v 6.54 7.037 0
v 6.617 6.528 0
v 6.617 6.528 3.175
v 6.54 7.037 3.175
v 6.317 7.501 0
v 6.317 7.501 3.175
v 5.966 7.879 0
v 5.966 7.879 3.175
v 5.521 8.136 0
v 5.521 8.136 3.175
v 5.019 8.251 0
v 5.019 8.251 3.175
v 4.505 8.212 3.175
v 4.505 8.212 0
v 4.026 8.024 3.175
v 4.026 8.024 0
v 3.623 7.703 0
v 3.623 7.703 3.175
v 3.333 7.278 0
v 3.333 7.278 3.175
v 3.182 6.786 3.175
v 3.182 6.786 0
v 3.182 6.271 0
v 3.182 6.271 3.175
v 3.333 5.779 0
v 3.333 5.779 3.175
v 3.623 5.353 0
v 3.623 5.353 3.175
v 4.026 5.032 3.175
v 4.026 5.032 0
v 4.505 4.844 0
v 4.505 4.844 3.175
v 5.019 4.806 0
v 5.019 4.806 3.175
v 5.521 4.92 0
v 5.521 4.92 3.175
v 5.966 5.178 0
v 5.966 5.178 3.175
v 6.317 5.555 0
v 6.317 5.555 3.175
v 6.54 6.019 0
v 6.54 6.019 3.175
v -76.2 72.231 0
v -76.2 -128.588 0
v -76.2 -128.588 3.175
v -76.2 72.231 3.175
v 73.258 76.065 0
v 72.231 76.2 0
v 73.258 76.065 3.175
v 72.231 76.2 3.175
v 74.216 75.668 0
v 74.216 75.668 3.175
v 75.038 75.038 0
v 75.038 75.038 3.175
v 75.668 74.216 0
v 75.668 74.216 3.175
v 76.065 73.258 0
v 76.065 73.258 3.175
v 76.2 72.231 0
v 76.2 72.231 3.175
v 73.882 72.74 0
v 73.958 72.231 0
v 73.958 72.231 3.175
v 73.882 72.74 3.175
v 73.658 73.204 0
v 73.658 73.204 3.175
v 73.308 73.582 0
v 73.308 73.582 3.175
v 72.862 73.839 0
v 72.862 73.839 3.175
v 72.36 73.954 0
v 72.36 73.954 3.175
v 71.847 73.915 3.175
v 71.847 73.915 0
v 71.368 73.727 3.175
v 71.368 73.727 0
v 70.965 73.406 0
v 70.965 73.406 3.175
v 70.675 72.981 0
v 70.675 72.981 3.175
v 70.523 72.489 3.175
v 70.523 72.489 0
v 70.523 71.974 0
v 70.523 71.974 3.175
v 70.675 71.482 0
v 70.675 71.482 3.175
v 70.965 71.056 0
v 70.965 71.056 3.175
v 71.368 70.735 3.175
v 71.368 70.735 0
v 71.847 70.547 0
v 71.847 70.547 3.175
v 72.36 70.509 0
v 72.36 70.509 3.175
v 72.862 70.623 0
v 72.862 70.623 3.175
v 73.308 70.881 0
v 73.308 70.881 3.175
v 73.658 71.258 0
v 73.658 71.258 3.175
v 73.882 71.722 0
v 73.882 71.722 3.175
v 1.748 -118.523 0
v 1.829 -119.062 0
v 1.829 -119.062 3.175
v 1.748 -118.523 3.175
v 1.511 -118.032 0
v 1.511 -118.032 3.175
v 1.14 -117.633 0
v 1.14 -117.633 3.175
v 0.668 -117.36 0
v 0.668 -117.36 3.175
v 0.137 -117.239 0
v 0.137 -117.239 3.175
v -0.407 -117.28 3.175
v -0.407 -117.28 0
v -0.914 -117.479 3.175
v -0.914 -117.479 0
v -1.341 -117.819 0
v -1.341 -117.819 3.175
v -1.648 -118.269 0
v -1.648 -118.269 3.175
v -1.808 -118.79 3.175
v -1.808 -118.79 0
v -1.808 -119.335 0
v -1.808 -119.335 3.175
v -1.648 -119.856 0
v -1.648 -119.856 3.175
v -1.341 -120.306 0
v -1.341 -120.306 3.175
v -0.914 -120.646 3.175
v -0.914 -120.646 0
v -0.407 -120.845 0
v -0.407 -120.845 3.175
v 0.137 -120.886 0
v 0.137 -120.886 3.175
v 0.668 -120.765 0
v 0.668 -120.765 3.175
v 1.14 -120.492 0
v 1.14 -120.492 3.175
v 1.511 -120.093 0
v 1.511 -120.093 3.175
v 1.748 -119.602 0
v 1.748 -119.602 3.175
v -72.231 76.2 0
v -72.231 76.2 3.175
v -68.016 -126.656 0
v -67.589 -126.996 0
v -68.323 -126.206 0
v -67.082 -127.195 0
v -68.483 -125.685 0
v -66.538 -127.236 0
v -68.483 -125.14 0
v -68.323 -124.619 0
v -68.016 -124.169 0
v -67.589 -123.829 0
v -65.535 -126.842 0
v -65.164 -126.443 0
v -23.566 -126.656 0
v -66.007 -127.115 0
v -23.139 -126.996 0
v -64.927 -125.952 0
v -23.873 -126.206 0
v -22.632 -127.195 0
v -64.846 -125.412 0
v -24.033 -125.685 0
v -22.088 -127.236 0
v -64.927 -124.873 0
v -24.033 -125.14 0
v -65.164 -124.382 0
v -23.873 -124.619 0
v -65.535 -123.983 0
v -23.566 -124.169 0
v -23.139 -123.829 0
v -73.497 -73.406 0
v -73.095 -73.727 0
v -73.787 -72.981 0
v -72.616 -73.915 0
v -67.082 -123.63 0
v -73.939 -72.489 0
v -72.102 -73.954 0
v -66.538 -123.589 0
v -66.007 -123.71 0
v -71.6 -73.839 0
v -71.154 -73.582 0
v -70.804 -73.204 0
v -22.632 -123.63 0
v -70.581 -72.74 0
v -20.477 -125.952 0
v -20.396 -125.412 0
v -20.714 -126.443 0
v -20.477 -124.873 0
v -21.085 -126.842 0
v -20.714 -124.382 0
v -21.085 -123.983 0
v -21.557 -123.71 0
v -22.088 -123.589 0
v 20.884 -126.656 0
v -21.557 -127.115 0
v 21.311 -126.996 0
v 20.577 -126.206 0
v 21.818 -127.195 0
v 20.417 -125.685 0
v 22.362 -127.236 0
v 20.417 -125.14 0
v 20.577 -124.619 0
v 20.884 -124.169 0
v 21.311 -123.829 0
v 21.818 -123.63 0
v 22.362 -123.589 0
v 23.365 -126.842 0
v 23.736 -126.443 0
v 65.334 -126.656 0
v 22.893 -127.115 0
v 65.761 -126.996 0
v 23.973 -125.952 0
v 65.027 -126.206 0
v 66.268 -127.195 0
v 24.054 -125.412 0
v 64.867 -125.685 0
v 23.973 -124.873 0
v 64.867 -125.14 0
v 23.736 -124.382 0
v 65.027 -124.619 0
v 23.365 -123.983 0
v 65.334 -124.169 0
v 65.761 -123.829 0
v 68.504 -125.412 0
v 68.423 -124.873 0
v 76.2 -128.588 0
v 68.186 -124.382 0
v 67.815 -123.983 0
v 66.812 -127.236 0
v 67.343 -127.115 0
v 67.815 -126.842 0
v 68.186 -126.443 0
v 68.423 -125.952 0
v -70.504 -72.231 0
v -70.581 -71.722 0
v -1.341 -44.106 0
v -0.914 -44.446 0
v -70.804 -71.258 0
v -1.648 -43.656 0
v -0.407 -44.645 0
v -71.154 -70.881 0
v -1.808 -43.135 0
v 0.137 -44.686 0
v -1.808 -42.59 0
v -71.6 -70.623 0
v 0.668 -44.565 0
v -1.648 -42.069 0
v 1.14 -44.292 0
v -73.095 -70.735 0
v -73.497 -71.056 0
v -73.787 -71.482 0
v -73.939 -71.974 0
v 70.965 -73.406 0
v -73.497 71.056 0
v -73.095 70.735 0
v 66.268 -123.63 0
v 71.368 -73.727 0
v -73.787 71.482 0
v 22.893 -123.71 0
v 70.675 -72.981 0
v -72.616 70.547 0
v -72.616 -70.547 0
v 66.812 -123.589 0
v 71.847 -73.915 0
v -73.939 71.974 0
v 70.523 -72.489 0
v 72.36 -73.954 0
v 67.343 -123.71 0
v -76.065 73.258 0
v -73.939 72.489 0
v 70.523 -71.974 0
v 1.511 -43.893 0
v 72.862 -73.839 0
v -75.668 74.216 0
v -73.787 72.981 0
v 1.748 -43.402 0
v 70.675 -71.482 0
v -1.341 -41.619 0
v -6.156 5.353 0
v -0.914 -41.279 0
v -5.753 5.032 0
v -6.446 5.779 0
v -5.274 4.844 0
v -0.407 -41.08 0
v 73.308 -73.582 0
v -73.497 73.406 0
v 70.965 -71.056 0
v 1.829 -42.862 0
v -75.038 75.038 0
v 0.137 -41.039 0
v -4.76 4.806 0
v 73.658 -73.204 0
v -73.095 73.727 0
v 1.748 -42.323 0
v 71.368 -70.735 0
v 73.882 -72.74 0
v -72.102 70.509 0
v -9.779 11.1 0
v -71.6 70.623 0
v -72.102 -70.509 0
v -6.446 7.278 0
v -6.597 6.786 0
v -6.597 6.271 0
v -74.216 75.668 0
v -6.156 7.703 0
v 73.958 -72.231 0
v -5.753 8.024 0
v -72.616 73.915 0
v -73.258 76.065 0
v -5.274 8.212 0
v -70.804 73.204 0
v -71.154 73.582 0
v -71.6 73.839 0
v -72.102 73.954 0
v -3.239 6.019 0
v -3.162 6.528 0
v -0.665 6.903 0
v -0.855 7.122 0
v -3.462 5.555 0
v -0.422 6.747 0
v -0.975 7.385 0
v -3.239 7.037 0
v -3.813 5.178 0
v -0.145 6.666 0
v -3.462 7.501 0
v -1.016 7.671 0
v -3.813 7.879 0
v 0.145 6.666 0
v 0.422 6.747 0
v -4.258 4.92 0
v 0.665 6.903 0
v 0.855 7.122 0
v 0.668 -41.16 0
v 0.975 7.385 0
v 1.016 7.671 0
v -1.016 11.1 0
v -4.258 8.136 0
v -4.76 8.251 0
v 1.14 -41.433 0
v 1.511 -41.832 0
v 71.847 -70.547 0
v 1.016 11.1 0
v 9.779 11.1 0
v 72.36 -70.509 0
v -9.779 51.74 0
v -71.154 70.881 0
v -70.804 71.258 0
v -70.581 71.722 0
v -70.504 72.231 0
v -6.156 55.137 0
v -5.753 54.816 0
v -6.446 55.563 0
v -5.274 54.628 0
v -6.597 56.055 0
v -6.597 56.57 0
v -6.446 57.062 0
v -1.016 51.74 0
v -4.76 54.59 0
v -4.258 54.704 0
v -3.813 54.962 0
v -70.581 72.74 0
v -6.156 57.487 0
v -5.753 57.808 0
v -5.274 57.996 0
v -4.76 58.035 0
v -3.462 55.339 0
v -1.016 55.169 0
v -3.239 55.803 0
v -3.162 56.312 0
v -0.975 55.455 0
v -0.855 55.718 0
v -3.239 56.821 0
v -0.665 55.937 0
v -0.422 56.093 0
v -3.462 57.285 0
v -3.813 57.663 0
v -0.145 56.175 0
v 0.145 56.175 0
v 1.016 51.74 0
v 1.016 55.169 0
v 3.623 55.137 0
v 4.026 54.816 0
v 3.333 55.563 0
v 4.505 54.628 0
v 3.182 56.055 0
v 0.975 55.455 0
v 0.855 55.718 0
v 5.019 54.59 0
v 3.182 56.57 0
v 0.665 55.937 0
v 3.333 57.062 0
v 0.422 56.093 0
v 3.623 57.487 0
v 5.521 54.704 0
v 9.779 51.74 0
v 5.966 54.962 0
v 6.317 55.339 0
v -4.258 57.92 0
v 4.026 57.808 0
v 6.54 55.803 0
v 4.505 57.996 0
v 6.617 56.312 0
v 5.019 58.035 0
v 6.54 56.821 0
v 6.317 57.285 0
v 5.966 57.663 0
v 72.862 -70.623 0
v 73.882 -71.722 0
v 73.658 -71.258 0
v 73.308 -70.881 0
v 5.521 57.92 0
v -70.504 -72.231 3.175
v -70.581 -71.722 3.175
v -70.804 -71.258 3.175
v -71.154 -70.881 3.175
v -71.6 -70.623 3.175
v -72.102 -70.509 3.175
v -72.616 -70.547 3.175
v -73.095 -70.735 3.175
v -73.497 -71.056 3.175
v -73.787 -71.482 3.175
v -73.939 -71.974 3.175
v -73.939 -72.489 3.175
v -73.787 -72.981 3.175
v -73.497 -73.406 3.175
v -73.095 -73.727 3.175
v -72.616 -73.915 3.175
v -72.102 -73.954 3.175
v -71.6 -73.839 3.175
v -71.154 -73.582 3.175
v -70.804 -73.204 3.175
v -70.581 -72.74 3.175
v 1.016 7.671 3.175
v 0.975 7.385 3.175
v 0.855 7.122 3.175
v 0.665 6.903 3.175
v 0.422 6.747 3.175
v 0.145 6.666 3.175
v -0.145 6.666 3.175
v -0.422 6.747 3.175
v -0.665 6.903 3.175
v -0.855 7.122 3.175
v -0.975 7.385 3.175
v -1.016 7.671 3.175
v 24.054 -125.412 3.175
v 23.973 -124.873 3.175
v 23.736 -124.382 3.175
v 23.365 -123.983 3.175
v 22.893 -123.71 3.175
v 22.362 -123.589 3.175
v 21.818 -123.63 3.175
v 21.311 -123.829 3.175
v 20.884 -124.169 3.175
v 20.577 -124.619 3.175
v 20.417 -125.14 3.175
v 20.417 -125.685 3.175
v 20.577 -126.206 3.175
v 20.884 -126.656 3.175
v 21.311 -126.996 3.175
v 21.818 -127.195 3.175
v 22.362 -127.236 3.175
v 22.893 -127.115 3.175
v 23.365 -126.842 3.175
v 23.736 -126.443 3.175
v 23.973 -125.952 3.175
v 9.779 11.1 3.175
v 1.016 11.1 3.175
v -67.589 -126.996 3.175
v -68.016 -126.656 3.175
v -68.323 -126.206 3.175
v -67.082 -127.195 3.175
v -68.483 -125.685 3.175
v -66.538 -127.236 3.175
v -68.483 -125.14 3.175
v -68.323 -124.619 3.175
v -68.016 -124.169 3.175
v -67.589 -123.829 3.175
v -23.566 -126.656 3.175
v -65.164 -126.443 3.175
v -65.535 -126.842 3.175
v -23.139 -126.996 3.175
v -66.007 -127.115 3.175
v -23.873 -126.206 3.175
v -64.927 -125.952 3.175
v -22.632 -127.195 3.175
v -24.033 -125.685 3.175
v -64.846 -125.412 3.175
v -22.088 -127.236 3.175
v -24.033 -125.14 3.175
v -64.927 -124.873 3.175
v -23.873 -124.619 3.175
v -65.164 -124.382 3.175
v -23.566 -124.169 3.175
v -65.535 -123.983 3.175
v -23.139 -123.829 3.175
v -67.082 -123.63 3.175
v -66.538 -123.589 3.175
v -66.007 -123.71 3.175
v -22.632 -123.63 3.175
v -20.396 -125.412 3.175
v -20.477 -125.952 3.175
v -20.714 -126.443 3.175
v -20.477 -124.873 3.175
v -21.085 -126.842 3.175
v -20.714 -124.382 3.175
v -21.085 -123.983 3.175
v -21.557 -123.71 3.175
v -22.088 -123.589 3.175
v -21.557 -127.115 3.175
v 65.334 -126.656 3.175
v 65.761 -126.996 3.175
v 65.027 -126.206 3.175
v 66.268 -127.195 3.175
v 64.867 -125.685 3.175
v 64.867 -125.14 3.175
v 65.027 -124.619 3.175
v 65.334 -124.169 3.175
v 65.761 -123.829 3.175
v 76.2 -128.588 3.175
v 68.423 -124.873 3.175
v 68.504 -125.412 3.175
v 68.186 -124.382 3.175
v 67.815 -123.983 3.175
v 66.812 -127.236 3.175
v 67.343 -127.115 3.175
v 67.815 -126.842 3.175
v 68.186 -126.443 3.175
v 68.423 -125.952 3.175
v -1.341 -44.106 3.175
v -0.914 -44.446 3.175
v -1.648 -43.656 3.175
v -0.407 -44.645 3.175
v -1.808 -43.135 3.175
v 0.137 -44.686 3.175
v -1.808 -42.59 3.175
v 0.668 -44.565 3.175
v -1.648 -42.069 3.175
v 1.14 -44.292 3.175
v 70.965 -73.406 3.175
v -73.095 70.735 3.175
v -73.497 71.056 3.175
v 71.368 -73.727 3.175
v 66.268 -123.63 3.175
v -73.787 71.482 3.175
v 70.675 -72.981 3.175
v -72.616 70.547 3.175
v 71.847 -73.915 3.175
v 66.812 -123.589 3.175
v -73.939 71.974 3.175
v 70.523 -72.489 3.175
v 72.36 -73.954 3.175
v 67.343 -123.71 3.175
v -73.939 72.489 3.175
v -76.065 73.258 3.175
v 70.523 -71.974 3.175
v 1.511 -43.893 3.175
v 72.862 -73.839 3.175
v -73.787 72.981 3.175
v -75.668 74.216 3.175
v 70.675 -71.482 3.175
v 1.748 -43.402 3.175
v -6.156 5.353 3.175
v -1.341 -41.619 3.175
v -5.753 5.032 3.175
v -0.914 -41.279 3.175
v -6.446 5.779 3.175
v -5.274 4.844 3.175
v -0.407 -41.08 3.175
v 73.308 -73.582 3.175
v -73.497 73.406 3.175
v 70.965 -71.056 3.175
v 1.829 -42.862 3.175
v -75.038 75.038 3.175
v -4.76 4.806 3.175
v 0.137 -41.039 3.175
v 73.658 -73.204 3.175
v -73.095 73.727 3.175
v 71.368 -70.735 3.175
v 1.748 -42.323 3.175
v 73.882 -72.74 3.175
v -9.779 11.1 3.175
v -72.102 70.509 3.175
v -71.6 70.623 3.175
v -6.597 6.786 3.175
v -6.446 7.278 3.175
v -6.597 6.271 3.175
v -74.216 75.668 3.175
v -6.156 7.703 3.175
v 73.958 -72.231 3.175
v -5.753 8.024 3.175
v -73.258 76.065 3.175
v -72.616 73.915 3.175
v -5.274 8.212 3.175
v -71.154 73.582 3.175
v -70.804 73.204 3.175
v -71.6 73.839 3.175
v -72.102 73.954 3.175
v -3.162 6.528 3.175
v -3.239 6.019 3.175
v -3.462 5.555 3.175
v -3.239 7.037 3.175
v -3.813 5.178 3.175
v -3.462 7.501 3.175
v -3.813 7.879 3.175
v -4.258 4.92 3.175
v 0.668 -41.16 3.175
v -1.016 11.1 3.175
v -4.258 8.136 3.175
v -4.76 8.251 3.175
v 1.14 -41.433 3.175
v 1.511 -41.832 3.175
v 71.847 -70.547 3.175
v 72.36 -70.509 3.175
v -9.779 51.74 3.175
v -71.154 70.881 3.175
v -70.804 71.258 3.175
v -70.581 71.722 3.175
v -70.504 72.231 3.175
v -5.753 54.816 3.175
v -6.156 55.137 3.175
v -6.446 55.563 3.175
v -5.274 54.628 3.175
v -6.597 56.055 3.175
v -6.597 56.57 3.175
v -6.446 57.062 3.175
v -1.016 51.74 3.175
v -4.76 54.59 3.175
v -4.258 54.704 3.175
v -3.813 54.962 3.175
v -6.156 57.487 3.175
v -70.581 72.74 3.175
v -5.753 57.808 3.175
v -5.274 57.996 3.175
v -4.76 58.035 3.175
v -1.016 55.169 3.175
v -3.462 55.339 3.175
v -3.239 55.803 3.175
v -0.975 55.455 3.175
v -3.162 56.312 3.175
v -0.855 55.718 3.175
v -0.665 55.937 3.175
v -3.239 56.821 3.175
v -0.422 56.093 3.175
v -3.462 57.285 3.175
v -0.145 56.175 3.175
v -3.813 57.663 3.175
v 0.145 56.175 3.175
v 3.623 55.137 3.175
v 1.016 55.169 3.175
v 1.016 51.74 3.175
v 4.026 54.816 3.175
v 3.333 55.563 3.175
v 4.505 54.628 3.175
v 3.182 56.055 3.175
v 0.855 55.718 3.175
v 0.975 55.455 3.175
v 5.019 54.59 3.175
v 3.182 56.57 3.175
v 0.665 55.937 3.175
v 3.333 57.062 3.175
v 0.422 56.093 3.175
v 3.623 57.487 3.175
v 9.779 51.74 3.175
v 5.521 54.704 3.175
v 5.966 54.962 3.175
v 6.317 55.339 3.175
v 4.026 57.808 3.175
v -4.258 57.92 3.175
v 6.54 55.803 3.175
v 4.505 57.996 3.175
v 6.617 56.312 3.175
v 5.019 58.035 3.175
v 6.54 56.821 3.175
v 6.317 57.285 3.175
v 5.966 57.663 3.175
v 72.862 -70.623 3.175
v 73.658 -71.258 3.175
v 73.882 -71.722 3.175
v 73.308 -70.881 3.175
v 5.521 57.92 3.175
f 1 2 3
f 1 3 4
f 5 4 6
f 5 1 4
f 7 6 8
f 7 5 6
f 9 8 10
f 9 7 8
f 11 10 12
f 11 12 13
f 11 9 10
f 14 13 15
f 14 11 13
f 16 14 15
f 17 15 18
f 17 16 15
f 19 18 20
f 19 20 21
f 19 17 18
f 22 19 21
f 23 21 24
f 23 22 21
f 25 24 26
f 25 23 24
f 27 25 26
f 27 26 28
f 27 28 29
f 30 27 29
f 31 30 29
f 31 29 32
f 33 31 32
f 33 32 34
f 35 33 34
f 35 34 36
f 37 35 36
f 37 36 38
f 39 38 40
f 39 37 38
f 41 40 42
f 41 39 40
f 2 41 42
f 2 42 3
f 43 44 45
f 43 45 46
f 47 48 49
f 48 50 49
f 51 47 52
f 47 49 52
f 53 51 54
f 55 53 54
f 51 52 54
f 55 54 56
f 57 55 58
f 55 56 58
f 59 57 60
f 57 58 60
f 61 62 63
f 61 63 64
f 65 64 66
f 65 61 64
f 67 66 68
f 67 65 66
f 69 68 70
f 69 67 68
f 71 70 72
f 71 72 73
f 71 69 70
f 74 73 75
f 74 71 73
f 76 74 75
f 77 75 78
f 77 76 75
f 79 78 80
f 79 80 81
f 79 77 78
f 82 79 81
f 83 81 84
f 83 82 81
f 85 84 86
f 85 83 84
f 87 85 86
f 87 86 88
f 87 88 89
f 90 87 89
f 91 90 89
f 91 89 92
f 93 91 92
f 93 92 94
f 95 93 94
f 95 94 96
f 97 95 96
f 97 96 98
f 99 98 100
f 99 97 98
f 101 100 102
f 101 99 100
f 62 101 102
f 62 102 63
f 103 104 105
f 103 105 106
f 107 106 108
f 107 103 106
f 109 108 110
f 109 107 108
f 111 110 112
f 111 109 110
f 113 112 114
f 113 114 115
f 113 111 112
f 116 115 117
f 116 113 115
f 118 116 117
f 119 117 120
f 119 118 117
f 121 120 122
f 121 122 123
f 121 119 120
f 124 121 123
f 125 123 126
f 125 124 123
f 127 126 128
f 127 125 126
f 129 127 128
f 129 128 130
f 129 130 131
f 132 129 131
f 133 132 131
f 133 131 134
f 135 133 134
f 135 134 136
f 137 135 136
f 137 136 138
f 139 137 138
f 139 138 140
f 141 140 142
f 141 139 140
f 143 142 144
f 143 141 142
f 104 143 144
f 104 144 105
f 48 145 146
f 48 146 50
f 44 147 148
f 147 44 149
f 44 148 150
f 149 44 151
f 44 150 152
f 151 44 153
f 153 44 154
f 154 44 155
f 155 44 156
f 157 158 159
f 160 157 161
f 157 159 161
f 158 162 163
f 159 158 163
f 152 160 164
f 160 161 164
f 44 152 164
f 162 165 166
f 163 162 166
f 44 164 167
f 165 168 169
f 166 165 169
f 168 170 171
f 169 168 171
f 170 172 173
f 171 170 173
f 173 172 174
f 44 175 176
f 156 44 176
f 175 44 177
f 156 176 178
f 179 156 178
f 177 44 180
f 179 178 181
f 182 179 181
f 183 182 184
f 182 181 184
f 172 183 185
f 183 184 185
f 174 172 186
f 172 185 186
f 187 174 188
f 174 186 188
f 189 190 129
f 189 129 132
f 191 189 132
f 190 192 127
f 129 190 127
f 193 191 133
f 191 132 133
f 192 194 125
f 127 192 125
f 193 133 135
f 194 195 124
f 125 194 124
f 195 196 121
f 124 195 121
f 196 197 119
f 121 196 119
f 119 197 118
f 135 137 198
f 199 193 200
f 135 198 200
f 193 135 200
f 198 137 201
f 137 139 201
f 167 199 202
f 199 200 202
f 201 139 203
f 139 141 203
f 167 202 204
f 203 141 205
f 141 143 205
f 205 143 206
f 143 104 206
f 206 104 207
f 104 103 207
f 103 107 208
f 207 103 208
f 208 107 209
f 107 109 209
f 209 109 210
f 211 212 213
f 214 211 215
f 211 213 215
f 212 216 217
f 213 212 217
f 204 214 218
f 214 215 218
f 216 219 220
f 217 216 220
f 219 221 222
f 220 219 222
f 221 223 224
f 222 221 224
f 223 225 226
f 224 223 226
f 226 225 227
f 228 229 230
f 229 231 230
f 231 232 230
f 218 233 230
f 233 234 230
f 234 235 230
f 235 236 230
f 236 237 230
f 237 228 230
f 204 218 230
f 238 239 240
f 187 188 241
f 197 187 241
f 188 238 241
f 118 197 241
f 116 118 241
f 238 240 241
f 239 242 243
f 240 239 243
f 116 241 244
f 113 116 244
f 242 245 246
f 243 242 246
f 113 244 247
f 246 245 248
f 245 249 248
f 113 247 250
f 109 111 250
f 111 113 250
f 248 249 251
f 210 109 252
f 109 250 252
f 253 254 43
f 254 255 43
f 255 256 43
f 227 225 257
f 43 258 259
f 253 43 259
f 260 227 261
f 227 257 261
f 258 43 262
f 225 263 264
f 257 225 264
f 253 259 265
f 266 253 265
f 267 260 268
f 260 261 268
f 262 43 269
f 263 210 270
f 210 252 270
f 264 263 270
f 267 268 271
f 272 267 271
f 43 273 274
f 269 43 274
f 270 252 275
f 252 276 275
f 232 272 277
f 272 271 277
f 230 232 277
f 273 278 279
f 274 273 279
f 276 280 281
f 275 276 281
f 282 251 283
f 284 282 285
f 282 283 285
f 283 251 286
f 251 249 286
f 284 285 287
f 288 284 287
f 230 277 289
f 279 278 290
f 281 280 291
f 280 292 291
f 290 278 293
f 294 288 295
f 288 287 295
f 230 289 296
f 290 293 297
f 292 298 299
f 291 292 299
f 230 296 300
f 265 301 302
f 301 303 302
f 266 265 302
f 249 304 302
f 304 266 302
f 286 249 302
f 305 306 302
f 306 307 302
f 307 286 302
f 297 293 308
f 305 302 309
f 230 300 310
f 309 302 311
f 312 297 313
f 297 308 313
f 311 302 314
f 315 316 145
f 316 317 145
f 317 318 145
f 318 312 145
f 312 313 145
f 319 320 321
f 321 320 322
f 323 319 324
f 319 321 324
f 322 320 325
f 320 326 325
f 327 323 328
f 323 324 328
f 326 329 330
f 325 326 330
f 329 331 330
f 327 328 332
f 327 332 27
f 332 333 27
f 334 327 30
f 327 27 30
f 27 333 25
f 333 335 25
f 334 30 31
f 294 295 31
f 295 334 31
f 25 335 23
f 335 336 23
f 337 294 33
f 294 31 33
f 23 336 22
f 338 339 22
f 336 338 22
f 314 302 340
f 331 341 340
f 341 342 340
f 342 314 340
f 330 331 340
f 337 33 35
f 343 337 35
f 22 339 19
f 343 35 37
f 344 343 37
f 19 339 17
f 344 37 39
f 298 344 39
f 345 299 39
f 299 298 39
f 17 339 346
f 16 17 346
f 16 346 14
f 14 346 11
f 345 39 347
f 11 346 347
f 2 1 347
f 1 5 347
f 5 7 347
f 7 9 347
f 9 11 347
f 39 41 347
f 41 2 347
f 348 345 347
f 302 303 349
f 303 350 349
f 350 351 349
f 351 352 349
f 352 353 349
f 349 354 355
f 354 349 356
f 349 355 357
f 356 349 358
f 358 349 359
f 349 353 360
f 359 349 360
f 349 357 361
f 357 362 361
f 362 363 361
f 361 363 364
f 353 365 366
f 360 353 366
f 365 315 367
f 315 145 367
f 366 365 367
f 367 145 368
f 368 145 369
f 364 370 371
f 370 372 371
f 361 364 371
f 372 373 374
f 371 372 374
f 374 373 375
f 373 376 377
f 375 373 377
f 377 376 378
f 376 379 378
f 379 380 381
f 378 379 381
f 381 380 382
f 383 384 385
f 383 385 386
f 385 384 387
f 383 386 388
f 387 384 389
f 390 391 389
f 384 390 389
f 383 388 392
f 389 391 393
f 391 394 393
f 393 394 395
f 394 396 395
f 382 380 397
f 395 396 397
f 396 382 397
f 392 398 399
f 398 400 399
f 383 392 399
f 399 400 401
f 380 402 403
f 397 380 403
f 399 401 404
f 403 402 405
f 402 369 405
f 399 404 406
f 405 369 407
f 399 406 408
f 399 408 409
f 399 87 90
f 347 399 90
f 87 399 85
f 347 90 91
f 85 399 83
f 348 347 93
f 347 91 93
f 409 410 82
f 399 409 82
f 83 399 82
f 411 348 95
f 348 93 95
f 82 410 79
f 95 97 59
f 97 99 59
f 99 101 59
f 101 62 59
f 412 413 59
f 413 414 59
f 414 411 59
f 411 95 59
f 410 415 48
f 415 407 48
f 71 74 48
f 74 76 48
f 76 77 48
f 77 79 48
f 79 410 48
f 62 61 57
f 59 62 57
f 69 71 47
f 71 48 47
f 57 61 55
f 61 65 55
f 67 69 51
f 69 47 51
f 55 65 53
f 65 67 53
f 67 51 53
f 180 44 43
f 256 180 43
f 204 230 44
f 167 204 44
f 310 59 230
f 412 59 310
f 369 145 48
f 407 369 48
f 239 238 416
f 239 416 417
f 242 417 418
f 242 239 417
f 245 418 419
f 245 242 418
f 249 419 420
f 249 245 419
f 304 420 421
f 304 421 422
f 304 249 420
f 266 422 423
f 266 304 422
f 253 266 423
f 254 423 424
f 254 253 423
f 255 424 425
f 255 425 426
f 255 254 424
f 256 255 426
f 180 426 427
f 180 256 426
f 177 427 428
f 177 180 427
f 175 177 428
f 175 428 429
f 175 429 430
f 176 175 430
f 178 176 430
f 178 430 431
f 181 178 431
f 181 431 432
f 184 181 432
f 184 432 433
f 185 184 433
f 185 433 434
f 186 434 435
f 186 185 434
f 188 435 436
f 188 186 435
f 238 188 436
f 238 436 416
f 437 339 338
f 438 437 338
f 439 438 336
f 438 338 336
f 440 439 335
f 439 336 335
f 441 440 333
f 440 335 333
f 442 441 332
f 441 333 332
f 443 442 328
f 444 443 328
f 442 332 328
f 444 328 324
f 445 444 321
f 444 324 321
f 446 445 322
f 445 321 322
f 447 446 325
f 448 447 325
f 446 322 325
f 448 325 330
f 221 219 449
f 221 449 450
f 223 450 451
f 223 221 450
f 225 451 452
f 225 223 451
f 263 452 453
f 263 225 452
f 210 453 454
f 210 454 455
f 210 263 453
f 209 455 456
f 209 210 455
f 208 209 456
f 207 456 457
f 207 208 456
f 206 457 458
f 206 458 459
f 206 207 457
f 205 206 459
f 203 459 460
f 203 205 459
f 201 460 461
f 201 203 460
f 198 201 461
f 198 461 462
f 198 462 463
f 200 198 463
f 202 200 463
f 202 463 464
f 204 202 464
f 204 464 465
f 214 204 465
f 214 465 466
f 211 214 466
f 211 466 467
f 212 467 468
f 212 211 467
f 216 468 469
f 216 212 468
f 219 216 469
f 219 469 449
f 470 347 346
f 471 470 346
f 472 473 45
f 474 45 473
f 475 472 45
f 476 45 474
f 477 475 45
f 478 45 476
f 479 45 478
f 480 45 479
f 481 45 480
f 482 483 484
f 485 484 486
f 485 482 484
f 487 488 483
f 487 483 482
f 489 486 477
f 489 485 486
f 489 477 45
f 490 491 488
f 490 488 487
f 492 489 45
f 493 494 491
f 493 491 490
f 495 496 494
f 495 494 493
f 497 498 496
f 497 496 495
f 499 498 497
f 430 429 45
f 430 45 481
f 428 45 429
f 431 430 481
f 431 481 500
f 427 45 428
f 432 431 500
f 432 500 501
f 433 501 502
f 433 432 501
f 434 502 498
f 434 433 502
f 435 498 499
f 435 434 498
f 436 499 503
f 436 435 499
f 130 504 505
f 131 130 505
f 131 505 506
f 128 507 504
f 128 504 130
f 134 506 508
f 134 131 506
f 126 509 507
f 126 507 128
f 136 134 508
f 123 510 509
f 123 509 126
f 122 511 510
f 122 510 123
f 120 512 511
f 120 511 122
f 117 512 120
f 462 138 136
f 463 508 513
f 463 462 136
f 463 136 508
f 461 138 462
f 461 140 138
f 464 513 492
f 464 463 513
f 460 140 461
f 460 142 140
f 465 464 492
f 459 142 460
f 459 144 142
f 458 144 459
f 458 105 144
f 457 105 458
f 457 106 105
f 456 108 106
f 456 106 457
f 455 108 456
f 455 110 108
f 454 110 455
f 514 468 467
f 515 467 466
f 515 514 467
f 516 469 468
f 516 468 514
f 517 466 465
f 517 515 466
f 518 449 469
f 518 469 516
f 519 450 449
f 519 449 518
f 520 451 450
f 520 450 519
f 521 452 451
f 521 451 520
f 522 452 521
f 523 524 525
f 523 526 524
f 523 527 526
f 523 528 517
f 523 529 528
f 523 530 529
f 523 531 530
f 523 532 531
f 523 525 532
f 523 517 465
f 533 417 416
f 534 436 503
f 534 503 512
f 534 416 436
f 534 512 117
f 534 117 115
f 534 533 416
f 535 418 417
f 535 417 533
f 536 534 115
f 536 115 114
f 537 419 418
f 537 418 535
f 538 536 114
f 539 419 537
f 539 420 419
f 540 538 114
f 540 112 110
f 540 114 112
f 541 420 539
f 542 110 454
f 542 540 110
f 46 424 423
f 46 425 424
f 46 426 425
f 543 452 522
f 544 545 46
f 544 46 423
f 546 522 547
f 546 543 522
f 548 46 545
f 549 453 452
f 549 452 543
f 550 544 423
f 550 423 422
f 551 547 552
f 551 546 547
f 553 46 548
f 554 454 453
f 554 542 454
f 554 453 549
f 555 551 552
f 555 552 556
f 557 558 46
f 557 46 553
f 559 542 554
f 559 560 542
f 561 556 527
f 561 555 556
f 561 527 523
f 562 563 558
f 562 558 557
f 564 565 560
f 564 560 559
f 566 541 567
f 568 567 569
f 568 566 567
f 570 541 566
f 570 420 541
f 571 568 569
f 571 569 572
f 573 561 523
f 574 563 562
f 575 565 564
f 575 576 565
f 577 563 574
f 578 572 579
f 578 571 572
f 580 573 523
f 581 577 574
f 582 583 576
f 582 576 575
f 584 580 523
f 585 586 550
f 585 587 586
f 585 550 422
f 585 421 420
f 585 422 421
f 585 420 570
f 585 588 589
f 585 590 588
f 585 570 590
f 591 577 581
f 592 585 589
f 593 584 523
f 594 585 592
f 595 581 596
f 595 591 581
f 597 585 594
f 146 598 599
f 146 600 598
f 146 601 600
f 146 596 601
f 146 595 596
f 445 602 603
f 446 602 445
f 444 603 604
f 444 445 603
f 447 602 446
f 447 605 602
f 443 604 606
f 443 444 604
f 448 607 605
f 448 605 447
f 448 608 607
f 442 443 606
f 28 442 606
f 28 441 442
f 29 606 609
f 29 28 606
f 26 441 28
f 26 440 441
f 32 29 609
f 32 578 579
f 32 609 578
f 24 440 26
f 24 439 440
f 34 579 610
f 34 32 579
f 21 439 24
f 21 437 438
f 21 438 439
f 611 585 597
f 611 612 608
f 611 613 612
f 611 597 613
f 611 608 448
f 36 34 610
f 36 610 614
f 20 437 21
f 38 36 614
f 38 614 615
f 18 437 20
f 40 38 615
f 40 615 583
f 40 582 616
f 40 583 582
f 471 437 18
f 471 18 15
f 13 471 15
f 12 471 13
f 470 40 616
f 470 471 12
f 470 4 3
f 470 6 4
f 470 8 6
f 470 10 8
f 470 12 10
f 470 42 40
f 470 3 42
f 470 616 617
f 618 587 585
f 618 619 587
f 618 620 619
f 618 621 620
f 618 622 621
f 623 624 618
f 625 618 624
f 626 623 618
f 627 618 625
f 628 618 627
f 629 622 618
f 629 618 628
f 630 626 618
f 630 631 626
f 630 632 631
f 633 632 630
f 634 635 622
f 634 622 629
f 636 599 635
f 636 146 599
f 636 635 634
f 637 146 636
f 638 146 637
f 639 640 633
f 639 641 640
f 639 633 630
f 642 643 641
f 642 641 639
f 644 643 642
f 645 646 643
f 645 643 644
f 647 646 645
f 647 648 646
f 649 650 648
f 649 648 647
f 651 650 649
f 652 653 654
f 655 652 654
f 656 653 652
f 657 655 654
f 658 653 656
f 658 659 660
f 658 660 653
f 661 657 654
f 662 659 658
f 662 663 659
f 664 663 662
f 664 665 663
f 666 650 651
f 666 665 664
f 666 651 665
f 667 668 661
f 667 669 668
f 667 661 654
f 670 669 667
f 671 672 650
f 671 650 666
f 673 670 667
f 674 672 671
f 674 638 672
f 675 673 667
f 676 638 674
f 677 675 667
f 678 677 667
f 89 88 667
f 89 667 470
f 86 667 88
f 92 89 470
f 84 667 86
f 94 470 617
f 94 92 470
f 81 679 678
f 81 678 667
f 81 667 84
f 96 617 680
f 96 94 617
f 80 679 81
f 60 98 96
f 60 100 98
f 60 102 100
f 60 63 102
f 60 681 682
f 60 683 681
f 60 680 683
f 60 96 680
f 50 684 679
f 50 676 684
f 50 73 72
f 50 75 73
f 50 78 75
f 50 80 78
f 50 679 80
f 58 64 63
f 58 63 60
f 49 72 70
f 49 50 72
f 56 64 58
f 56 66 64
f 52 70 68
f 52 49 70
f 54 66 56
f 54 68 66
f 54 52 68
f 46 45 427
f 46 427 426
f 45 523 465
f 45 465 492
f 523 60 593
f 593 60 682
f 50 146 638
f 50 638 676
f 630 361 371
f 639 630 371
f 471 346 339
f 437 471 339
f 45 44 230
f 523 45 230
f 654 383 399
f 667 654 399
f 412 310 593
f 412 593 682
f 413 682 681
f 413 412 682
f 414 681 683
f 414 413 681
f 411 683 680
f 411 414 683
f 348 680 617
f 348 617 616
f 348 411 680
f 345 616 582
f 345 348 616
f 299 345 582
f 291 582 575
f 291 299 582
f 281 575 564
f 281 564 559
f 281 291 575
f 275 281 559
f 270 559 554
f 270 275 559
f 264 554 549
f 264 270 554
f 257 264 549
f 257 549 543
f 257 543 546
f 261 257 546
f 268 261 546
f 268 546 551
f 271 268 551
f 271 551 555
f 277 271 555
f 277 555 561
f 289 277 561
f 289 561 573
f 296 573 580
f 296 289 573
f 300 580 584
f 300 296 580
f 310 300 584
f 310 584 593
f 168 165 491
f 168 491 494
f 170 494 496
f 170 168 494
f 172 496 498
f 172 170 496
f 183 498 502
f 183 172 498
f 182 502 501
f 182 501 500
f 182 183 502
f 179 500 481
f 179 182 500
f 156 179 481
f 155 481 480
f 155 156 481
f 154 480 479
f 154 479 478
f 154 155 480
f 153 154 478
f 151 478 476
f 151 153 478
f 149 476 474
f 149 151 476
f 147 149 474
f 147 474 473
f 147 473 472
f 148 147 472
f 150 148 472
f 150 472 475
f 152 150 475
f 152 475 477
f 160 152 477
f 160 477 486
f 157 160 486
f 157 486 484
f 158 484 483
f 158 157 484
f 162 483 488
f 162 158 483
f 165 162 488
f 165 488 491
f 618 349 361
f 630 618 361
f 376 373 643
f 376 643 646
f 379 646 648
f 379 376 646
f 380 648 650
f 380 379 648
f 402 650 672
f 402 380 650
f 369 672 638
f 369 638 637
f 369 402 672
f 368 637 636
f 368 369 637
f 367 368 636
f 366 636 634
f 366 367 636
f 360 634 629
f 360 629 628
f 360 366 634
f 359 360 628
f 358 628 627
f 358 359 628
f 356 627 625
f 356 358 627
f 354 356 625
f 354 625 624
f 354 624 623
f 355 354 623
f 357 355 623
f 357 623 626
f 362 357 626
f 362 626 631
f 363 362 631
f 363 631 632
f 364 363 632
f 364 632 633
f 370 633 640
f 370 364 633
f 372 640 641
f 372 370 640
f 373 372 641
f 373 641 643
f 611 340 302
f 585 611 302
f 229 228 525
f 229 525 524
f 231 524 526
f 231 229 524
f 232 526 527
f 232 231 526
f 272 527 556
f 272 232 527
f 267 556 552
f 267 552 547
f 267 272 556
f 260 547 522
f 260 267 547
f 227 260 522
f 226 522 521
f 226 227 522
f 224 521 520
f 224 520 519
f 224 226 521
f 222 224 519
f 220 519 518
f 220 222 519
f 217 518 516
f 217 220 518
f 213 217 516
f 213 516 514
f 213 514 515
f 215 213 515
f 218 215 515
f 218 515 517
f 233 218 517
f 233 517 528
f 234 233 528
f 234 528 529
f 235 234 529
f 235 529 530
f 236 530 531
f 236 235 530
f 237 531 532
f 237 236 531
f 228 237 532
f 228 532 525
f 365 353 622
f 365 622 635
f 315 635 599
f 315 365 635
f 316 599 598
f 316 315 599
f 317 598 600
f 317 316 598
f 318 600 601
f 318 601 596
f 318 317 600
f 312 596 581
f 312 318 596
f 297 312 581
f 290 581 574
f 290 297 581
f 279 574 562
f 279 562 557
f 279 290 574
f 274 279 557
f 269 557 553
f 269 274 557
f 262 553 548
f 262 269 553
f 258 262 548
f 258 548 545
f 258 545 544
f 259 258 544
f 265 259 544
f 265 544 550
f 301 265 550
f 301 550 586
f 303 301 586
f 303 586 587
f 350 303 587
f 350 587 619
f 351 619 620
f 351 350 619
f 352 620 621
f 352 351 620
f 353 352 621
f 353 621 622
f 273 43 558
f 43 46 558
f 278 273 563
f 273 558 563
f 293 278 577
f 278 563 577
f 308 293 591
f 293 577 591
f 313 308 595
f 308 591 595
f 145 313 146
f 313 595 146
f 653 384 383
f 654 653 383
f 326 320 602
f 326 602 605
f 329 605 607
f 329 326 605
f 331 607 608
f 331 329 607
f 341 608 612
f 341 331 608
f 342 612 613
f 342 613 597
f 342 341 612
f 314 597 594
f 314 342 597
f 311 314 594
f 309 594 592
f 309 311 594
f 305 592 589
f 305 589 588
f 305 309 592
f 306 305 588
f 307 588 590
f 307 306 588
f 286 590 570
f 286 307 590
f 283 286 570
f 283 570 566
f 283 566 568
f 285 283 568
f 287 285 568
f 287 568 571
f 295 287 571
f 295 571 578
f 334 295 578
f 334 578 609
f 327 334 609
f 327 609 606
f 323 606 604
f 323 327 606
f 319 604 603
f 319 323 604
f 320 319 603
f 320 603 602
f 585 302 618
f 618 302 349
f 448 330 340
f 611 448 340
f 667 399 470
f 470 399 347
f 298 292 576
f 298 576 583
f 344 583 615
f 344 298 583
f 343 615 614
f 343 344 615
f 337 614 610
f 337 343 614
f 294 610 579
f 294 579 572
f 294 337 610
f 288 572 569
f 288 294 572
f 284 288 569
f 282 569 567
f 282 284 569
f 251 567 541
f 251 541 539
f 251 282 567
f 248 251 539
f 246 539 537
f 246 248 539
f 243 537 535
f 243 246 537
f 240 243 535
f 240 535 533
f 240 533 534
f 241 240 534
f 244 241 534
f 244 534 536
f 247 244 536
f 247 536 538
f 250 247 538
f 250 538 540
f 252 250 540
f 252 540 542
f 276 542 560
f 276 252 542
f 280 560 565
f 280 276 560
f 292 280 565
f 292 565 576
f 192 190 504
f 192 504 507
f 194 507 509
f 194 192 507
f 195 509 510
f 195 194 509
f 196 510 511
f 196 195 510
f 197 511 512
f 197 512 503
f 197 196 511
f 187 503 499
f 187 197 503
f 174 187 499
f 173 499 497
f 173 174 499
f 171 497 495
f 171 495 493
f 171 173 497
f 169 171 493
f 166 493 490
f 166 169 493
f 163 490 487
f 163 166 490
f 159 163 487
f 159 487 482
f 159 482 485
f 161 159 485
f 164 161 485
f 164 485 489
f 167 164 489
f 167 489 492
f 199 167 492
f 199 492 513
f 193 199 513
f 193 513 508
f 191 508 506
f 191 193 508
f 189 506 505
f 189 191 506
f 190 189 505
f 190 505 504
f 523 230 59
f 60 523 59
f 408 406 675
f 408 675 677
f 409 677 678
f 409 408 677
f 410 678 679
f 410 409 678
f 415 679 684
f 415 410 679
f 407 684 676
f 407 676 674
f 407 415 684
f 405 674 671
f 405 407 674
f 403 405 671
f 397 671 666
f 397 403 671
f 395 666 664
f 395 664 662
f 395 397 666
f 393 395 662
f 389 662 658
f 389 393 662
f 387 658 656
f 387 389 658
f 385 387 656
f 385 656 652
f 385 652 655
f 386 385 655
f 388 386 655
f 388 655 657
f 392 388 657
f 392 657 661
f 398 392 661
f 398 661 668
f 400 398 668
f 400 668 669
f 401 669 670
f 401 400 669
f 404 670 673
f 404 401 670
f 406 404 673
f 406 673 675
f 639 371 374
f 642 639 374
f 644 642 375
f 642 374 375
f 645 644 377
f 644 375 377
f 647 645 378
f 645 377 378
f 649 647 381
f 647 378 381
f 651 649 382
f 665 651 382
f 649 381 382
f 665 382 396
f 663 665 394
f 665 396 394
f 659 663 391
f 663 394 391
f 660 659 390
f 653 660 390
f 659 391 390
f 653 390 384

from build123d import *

# Parameters (mm, degrees)
F0_W     = 152.4
F0_H     = 204.7875
F0_R     = 1.8288
F0_R_2   = 1.7272
F1_DEPTH = 3.175
F2_R     = 3.96875


with BuildPart() as f1:
    # F0 (on Top) → F1 (new body)
    with BuildSketch(Plane.XY):
        with Locations((0, -26.19375)):
            Rectangle(F0_W, F0_H)
        with Locations((-66.675, -125.4125)):
            Circle(F0_R, mode=Mode.SUBTRACT)
        with Locations((-22.225, -125.4125)):
            Circle(F0_R, mode=Mode.SUBTRACT)
        with Locations((-72.23125, -72.23125)):
            Circle(F0_R_2, mode=Mode.SUBTRACT)
        with Locations((0, -119.0625)):
            Circle(F0_R, mode=Mode.SUBTRACT)
        with Locations((22.225, -125.4125)):
            Circle(F0_R, mode=Mode.SUBTRACT)
        with Locations((66.675, -125.4125)):
            Circle(F0_R, mode=Mode.SUBTRACT)
        with Locations((0, -42.8625)):
            Circle(F0_R, mode=Mode.SUBTRACT)
        with Locations((72.23125, -72.23125)):
            Circle(F0_R_2, mode=Mode.SUBTRACT)
        with Locations((-4.8895, 6.528203)):
            Circle(F0_R_2, mode=Mode.SUBTRACT)
        with Locations((-72.23125, 72.23125)):
            Circle(F0_R_2, mode=Mode.SUBTRACT)
        with Locations((-4.8895, 56.312203)):
            Circle(F0_R_2, mode=Mode.SUBTRACT)
        with Locations((4.8895, 6.528203)):
            Circle(F0_R_2, mode=Mode.SUBTRACT)
        with BuildLine():
            Line((1.016, 55.169203), (1.016, 51.740203))
            Line((1.016, 51.740203), (9.779, 51.740203))
            Line((9.779, 51.740203), (9.779, 11.100203))
            Line((9.779, 11.100203), (1.016, 11.100203))
            Line((1.016, 11.100203), (1.016, 7.671203))
            ThreePointArc((1.016, 7.671203), (0, 6.655203), (-1.016, 7.671203))
            Line((-1.016, 7.671203), (-1.016, 11.100203))
            Line((-1.016, 11.100203), (-9.779, 11.100203))
            Line((-9.779, 11.100203), (-9.779, 51.740203))
            Line((-9.779, 51.740203), (-1.016, 51.740203))
            Line((-1.016, 51.740203), (-1.016, 55.169203))
            ThreePointArc((-1.016, 55.169203), (0, 56.185203), (1.016, 55.169203))
        make_face(mode=Mode.SUBTRACT)
        with Locations((4.8895, 56.312203)):
            Circle(F0_R_2, mode=Mode.SUBTRACT)
        with Locations((72.23125, 72.23125)):
            Circle(F0_R_2, mode=Mode.SUBTRACT)
    extrude(amount=F1_DEPTH)

    # F2
    f2_edges = [f1.edges().sort_by_distance(p)[0] for p in [
        (-76.2, 76.2, 1.5875),
        (76.2, 76.2, 1.5875),
    ]]
    fillet(f2_edges, radius=F2_R)


solid = f1.part
